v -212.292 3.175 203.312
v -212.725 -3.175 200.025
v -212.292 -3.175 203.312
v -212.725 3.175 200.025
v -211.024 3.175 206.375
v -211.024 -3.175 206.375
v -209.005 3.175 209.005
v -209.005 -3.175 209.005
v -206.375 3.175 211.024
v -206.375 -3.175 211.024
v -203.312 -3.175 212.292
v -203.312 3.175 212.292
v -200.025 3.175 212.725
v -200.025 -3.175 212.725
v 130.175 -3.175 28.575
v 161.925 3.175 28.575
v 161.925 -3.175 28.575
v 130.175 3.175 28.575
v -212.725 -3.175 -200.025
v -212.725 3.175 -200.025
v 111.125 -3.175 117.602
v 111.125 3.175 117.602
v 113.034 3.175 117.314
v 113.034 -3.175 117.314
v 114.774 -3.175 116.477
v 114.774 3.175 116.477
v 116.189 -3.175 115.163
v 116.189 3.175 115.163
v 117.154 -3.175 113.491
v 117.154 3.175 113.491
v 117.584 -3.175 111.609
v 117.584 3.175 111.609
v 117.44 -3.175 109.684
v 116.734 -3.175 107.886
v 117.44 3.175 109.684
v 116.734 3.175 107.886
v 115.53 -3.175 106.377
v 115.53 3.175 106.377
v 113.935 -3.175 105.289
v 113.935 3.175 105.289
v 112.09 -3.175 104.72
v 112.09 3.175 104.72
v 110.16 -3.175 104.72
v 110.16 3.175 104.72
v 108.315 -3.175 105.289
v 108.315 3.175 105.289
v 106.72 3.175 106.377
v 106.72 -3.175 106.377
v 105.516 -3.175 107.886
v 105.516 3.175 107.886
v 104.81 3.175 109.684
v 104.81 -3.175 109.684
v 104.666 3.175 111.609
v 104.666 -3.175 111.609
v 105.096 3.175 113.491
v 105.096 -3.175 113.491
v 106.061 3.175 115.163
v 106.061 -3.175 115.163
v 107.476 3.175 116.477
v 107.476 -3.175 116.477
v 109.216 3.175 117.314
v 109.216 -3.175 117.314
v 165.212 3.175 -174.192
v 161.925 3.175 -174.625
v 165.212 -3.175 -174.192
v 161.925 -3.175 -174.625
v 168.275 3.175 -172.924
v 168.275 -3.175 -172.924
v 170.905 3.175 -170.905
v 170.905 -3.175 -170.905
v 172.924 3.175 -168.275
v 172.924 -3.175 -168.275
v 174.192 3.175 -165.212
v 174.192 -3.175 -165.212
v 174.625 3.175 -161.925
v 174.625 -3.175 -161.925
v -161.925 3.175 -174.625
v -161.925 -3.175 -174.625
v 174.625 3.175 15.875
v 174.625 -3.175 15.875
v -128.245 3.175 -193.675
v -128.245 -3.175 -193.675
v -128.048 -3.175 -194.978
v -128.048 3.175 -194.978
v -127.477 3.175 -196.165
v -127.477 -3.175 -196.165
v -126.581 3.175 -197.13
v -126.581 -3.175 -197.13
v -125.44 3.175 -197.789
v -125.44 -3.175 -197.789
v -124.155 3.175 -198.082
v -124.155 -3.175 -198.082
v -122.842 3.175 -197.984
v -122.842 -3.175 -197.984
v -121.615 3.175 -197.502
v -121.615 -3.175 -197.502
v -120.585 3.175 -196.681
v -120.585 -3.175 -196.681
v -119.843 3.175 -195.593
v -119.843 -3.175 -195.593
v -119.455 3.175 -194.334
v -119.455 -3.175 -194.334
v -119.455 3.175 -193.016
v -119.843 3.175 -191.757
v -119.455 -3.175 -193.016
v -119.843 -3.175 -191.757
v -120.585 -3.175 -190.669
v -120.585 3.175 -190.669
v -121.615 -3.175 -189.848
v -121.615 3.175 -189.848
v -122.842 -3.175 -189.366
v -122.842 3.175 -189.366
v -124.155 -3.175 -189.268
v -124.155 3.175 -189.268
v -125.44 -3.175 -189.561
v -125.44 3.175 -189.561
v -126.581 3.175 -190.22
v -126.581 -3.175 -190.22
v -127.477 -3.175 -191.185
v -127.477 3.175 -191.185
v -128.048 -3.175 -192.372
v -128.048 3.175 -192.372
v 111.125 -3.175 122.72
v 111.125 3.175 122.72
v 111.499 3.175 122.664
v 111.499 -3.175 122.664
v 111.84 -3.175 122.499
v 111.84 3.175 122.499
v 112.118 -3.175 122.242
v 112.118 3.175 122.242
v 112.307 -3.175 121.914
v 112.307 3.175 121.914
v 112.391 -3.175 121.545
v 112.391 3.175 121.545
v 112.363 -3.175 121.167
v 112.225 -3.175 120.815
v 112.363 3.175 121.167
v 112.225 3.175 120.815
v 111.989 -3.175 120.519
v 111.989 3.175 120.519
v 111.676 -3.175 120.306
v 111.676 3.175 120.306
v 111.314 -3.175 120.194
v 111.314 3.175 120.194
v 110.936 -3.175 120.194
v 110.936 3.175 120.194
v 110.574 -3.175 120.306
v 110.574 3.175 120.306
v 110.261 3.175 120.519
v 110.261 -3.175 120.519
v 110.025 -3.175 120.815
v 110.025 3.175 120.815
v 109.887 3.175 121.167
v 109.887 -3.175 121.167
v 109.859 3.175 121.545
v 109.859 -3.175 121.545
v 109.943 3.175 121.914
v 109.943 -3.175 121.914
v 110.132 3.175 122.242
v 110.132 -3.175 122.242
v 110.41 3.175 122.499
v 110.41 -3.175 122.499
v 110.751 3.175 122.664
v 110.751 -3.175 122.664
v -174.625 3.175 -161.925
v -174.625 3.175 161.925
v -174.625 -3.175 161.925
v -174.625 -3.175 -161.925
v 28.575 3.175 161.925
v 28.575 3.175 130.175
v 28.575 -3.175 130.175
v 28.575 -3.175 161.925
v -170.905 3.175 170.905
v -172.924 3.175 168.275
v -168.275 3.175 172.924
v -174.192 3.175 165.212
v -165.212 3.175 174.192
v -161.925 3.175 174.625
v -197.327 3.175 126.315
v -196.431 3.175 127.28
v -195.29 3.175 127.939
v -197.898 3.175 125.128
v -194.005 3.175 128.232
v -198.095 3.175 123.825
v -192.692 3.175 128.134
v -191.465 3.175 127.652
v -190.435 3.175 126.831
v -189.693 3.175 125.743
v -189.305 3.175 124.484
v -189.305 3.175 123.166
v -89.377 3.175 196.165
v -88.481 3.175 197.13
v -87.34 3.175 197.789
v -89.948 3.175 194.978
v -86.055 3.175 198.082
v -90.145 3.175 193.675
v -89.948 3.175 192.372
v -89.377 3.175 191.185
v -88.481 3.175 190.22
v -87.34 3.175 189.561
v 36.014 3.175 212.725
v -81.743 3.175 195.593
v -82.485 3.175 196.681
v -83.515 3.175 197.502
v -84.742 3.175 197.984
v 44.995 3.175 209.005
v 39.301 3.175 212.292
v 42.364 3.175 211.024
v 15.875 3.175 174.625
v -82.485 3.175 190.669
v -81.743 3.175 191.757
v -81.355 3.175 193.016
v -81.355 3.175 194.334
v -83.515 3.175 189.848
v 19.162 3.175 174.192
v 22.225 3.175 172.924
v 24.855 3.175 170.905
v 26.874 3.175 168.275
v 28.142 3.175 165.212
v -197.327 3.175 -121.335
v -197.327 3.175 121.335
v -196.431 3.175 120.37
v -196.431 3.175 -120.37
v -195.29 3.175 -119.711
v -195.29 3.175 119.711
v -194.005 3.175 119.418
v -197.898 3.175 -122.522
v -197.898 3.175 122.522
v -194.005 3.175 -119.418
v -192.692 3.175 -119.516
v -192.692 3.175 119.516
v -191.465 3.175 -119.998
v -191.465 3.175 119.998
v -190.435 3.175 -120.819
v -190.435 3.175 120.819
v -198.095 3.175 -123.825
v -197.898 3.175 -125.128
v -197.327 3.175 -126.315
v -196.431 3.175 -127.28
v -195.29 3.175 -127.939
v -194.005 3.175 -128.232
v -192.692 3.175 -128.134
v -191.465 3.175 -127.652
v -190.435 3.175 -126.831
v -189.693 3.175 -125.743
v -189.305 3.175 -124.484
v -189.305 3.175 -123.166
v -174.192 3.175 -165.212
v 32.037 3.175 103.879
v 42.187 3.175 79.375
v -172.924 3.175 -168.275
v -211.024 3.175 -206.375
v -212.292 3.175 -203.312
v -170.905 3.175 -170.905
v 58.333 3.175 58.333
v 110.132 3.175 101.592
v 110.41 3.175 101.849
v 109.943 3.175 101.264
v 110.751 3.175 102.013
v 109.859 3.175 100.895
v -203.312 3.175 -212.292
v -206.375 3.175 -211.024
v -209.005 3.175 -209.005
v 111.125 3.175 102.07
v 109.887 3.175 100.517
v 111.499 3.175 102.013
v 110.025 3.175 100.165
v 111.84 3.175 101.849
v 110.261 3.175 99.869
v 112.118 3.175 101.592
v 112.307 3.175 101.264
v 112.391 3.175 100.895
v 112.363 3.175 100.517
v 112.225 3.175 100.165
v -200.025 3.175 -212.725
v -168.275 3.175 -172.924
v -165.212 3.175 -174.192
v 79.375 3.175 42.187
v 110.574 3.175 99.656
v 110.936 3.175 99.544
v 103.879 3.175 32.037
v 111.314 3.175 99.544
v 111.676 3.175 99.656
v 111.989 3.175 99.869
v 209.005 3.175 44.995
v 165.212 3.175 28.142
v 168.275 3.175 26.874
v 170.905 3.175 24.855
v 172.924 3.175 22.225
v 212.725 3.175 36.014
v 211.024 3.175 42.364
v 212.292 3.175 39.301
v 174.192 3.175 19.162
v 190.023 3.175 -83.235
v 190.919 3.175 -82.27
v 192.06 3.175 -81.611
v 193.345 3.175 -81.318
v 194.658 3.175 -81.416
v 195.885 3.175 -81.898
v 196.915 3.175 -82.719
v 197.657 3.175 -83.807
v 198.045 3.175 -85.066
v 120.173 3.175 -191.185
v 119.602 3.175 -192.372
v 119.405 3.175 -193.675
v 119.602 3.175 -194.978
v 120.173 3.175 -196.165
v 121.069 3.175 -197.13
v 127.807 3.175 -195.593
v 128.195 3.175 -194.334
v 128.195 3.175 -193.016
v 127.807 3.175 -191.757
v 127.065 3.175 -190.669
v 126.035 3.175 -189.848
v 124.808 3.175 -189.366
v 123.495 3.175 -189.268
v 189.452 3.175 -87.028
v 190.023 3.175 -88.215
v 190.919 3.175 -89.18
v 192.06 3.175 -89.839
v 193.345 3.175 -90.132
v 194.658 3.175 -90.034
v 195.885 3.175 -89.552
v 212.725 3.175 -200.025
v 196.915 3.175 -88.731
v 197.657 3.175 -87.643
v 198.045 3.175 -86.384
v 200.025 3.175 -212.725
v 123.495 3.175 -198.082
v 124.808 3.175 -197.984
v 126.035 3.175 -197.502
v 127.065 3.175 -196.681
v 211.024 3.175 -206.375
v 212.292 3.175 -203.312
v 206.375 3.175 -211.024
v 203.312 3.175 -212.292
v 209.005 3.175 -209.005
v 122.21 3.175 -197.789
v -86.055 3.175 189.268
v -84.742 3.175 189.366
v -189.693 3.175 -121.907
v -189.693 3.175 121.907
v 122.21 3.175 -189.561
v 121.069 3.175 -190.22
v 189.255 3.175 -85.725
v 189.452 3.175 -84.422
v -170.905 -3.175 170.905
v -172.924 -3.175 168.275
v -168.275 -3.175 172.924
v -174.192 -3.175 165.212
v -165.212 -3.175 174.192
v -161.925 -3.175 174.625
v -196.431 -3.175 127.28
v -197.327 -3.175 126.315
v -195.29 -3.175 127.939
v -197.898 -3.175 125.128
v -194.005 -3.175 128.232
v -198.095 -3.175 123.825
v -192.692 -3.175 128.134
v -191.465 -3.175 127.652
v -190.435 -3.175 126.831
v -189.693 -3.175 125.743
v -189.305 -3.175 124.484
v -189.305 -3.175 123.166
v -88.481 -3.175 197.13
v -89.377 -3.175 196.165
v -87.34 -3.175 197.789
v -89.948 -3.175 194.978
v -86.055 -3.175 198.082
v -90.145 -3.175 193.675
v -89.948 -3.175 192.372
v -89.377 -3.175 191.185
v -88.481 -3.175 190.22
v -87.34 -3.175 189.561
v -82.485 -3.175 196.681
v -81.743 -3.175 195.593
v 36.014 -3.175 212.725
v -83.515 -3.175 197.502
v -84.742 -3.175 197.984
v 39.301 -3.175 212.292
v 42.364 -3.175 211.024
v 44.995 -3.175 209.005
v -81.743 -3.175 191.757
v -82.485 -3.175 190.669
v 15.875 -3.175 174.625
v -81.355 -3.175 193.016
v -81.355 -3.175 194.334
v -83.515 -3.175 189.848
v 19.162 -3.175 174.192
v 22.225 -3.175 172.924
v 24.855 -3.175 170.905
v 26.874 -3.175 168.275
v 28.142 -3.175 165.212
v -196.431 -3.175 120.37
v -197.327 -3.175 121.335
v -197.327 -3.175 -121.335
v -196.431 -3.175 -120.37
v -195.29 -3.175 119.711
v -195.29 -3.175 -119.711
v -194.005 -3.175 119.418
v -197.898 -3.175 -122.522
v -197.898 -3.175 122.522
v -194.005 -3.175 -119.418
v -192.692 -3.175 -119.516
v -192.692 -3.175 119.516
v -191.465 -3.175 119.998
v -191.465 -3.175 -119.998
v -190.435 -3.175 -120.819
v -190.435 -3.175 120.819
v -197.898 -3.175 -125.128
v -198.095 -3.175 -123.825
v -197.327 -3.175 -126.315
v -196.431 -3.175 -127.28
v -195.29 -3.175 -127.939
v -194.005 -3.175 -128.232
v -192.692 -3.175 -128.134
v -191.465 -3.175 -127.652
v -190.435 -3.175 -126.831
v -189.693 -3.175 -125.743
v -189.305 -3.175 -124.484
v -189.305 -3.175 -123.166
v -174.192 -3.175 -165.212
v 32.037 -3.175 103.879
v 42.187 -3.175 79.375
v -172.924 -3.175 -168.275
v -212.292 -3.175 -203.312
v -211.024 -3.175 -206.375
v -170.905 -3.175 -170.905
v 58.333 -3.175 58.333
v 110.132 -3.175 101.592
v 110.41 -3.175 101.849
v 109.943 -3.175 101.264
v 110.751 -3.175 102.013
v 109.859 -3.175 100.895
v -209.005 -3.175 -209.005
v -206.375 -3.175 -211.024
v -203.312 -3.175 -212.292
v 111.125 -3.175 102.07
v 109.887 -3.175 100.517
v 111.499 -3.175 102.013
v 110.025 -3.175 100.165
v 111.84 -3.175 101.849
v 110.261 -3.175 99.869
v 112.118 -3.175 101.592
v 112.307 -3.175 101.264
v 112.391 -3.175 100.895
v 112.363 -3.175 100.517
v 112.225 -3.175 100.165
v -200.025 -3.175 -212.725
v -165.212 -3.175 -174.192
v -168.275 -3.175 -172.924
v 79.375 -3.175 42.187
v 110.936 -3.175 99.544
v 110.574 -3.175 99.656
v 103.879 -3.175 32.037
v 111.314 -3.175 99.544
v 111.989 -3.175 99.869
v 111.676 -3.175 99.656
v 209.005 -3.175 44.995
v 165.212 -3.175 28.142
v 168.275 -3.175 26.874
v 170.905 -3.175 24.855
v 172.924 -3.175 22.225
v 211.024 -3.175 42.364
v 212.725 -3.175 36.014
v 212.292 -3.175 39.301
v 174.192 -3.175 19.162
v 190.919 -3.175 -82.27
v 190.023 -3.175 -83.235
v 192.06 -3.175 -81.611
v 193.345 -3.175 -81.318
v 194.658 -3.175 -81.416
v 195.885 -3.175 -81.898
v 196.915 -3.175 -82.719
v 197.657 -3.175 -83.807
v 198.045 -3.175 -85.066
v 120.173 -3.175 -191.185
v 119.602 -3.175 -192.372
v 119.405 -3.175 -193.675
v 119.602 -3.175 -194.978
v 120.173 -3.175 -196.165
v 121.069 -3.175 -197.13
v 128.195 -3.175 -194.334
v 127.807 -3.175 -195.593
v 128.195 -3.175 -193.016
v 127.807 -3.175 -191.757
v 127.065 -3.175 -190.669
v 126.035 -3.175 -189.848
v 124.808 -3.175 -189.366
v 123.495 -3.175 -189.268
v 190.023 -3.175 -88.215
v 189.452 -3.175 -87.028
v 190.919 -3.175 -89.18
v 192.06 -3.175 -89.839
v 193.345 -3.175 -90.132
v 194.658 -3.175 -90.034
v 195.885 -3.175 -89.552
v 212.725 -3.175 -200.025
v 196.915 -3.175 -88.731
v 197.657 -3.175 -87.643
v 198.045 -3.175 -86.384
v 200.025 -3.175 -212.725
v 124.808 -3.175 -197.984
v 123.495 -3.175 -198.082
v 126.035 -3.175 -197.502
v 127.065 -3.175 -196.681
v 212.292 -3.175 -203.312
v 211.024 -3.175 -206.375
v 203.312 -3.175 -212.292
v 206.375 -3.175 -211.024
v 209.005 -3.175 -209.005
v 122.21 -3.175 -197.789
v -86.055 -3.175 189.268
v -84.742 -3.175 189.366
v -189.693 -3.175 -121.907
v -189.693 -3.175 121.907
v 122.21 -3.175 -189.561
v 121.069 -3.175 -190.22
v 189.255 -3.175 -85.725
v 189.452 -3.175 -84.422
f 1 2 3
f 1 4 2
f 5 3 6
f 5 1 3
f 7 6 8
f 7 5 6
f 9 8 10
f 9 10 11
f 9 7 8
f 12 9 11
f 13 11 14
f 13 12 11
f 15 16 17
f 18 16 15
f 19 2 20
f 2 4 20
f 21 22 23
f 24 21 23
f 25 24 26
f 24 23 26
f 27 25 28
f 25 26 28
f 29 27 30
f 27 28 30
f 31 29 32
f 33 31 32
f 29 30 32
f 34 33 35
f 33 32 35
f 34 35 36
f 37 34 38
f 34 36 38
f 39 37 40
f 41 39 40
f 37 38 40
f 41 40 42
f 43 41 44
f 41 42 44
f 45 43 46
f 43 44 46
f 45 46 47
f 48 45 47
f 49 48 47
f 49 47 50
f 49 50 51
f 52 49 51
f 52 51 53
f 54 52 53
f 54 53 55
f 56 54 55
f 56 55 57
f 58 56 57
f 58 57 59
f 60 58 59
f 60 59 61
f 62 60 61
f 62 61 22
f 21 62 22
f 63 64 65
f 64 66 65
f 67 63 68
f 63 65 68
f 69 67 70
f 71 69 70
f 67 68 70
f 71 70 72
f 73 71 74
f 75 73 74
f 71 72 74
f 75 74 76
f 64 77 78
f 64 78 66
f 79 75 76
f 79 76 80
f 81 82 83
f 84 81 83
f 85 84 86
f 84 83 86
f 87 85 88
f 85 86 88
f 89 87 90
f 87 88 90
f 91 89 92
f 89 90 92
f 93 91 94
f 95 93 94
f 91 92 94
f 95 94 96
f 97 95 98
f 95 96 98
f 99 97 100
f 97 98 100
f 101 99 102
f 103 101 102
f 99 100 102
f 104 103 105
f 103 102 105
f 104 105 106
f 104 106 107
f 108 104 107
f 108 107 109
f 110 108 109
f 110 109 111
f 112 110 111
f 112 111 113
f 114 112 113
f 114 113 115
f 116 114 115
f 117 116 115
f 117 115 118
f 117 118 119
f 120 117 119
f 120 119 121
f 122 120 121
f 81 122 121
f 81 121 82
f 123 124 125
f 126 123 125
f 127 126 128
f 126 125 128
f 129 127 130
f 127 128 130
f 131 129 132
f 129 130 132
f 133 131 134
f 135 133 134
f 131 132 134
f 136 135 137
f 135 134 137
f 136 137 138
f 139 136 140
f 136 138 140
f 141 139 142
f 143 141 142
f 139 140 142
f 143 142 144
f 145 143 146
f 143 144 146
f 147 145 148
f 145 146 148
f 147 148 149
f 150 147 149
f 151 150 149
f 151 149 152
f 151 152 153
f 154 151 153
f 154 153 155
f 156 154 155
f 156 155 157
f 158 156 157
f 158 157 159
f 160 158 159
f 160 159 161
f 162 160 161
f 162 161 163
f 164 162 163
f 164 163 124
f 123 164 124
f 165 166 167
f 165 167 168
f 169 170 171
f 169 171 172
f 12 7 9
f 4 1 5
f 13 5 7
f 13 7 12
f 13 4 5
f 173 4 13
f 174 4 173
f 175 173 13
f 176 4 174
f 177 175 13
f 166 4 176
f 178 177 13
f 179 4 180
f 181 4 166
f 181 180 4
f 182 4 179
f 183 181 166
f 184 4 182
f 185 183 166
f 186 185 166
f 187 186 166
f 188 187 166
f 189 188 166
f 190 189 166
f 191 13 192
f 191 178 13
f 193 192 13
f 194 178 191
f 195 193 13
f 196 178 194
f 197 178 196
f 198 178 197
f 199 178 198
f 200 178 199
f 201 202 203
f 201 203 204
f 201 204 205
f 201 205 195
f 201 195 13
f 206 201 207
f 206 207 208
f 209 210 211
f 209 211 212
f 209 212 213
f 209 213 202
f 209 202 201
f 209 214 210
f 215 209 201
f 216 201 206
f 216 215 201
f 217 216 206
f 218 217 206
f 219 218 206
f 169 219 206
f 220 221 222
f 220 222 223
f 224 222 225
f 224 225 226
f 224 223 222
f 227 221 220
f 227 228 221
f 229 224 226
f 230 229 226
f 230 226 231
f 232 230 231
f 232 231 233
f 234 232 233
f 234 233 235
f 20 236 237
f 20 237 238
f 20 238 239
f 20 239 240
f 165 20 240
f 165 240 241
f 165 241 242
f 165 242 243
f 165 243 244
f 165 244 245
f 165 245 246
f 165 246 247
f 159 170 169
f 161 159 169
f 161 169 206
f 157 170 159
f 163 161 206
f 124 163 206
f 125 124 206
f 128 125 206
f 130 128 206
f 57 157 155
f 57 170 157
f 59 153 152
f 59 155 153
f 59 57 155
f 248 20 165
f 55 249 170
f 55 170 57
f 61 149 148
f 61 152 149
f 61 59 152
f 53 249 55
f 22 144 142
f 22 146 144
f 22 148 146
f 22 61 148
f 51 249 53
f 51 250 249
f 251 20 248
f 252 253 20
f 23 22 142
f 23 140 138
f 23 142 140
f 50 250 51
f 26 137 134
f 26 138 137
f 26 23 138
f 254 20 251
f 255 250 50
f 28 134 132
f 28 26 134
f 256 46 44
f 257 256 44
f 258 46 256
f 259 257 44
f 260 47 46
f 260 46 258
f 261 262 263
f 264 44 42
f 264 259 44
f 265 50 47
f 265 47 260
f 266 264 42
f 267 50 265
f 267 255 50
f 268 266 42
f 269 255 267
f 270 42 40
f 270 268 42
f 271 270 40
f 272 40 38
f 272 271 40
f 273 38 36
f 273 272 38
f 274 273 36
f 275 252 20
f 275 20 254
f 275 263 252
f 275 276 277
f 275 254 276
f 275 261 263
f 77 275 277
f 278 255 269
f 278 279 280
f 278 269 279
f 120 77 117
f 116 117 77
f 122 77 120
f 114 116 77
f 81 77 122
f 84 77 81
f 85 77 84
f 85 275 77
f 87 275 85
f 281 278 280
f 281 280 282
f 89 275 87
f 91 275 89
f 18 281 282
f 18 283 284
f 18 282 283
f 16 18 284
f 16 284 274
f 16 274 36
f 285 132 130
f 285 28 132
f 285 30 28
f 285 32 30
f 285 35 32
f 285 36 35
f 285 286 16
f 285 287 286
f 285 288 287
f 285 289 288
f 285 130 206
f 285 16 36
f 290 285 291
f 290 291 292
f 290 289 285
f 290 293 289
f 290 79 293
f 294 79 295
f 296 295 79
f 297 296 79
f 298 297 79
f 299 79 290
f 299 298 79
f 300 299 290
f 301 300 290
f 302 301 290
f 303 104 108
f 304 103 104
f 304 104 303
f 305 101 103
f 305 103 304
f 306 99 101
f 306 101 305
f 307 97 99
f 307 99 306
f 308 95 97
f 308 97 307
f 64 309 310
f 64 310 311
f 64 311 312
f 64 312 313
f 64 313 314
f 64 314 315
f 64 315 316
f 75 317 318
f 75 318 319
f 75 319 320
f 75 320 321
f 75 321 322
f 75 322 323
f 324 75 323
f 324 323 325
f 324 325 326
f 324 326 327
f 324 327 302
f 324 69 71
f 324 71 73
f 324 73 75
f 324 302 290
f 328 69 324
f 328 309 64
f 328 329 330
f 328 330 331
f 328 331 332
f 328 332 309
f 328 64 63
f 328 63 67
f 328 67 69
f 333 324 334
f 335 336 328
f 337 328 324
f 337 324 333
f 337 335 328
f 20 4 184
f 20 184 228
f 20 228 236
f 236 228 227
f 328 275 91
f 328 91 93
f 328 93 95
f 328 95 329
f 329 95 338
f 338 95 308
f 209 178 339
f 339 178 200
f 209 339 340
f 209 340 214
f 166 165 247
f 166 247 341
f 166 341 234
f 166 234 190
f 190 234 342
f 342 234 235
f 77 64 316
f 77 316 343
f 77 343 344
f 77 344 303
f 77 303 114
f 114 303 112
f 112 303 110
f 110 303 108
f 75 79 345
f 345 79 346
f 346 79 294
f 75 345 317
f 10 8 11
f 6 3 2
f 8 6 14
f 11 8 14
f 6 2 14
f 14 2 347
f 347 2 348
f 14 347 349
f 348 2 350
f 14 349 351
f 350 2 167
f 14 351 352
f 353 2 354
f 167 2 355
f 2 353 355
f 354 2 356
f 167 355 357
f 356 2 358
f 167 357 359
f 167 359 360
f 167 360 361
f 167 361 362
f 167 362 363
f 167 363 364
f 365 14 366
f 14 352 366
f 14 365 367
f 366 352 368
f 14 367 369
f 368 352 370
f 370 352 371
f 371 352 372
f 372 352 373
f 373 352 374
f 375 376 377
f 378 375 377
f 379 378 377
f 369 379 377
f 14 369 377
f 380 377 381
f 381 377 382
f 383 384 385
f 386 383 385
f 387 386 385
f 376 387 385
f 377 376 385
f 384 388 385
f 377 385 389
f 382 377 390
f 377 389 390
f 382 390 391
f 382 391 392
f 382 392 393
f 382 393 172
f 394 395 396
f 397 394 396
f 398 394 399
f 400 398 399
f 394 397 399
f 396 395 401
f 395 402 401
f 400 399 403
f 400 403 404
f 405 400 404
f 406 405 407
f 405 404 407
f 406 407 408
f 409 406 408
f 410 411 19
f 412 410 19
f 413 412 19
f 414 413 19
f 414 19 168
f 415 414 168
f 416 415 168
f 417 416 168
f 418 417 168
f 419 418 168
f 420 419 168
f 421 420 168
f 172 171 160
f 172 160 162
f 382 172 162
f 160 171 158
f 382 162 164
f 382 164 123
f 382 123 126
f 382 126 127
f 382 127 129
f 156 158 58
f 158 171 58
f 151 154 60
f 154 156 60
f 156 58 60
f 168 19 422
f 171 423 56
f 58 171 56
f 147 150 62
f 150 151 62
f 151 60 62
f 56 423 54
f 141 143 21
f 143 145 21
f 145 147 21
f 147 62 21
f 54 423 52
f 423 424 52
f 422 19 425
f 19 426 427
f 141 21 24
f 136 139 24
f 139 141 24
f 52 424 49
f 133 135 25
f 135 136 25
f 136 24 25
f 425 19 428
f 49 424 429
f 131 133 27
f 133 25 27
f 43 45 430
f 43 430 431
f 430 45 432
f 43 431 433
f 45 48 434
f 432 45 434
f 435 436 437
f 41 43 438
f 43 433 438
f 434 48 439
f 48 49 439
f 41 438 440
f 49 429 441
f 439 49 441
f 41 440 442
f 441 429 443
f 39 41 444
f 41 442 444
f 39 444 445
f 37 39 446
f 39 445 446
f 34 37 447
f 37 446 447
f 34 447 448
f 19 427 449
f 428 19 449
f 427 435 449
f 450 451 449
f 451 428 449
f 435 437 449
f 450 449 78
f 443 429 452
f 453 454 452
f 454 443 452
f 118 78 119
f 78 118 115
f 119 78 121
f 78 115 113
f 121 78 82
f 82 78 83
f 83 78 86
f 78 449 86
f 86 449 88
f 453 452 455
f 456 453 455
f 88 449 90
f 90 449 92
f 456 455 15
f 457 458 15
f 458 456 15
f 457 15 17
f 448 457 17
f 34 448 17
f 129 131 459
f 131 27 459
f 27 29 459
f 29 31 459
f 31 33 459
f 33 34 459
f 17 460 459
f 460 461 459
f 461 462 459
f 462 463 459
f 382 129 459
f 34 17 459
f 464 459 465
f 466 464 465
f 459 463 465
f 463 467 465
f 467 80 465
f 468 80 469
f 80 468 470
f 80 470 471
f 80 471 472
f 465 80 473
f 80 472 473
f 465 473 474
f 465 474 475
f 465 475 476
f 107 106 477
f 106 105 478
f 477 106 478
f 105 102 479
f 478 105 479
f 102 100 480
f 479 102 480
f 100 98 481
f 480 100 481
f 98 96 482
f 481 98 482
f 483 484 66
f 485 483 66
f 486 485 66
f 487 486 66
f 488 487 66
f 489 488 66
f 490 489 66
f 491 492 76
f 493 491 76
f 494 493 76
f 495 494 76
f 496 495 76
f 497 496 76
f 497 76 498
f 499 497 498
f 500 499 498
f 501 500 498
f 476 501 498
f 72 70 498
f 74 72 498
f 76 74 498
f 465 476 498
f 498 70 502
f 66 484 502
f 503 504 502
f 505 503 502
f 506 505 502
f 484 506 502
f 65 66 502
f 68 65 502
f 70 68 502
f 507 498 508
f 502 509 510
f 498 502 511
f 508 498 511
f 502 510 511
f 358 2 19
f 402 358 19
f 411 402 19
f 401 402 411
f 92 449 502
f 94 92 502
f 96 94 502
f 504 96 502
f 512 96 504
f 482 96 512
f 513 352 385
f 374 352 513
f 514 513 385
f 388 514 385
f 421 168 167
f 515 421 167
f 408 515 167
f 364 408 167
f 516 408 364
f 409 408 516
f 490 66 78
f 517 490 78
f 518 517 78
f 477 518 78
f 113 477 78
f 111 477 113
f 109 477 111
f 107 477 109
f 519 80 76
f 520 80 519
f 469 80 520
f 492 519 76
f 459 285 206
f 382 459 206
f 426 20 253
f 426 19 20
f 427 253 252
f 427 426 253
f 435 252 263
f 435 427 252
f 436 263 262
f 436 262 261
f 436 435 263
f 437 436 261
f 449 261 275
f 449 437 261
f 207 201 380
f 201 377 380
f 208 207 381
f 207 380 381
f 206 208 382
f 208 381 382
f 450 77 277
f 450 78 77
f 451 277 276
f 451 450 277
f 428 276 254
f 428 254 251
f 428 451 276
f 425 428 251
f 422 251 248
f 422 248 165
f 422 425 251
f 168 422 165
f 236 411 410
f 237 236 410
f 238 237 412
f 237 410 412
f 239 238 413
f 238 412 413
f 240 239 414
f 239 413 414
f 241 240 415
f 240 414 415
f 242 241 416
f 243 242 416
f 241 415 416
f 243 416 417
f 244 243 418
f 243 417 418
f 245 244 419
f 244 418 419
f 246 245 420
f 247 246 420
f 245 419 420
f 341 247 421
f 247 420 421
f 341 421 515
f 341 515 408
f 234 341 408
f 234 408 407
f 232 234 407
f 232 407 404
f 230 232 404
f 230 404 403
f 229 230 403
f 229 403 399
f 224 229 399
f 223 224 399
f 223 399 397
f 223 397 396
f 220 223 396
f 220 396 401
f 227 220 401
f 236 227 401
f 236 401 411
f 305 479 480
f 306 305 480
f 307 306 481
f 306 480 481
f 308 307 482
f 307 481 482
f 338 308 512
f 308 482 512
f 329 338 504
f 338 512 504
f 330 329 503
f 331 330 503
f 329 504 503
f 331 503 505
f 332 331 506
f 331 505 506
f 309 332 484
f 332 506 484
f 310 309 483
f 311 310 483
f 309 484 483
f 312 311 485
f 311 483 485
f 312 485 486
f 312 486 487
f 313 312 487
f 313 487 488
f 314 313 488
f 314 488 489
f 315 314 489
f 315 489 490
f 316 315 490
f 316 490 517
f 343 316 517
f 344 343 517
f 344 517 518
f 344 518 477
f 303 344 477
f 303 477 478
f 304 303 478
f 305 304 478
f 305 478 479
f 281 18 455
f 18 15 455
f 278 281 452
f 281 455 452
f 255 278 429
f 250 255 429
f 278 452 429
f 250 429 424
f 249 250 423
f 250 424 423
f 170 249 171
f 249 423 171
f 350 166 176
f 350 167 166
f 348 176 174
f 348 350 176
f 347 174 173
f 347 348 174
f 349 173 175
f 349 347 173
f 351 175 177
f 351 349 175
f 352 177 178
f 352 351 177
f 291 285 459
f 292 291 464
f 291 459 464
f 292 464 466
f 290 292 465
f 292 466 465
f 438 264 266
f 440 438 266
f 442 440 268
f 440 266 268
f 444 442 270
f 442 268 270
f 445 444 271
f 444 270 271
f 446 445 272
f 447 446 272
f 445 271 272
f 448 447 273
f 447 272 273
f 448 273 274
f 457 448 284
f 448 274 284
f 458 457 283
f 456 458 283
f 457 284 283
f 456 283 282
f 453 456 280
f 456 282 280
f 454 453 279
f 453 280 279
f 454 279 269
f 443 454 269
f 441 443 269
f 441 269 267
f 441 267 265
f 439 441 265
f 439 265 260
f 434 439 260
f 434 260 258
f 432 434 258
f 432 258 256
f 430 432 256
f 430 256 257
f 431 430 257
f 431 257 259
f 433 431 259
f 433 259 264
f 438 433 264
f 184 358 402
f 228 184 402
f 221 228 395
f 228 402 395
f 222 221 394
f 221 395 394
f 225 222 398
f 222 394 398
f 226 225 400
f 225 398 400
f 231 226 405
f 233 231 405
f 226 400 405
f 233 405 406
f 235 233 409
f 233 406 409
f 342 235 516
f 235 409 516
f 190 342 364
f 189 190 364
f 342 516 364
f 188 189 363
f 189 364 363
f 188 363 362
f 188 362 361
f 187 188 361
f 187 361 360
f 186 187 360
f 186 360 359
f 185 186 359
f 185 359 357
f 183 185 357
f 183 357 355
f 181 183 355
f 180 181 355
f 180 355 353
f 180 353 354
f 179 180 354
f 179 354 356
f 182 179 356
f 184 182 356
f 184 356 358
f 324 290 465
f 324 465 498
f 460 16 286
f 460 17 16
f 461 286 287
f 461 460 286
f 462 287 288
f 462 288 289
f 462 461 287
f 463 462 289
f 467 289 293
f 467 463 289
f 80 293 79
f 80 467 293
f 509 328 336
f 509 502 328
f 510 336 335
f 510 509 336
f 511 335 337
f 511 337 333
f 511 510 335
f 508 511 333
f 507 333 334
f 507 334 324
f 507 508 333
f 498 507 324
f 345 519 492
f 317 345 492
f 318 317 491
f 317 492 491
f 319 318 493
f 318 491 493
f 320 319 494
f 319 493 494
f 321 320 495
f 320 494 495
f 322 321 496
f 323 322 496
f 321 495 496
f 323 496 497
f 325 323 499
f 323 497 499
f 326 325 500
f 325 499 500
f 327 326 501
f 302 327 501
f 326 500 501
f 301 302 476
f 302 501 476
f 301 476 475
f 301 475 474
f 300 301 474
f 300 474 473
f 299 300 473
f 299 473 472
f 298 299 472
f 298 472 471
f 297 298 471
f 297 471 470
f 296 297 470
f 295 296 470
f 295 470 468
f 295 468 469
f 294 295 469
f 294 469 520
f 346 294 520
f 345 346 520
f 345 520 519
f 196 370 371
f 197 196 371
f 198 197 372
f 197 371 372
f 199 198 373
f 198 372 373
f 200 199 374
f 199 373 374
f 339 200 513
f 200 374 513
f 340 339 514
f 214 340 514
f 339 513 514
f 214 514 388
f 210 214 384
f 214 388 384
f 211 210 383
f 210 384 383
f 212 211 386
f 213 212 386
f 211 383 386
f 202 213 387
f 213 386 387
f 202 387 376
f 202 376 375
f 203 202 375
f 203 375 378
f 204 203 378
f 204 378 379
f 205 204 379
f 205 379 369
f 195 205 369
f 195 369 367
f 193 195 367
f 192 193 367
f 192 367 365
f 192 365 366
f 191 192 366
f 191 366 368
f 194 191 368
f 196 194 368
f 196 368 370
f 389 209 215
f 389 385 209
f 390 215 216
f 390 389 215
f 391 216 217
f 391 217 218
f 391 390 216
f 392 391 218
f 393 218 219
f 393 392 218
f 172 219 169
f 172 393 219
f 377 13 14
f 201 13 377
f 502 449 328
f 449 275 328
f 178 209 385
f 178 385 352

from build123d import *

# Parameters (mm, degrees)
SKETCH1_W                = 425.45
SKETCH1_H                = 425.45
BOSS_EXTRUDE1_DEPTH      = 3.175
CUT_EXTRUDE1_DEPTH       = 301.90558943
SKETCH3_R                = 6.477
SKETCH3_R_2              = 1.27
CUT_EXTRUDE2_DEPTH       = 301.90558943
F_0_332_DIAMETER_HOLE1_D = 8.8392
CUT_EXTRUDE3_DEPTH       = 301.90558943
FILLET1_R                = 12.7
FILLET2_R                = 101.6


with BuildPart() as part:
    # Sketch1 → Boss-Extrude1 (new, symmetric)
    with BuildSketch(Plane(origin=(0, 0, 0), x_dir=(1, 0, 0), z_dir=(0, 1, 0))):
        Rectangle(SKETCH1_W, SKETCH1_H)
    extrude(amount=BOSS_EXTRUDE1_DEPTH, both=True)

    # Sketch2 → Cut-Extrude1 (cut, through all)
    with BuildSketch(Plane(origin=(0, 3.175, 0), x_dir=(1, 0, 0), z_dir=(0, 1, 0))):
        Polygon((212.725, -212.725), (212.725, -41.275), (41.275, -212.725), align=None)
    extrude(amount=-CUT_EXTRUDE1_DEPTH, mode=Mode.SUBTRACT)

    # Sketch3 → Cut-Extrude2 (cut, through all)
    with BuildSketch(Plane(origin=(0, 3.175, 0), x_dir=(1, 0, 0), z_dir=(0, 1, 0))):
        with Locations(Location((111.125, -111.125, 0), (0, 0, 270))):
            Circle(SKETCH3_R)
        with Locations(Location((111.125, -100.7999, 0), (0, 0, 270))):
            Circle(SKETCH3_R_2)
        with Locations(Location((111.125, -121.4501, 0), (0, 0, 270))):
            Circle(SKETCH3_R_2)
    extrude(amount=-CUT_EXTRUDE2_DEPTH, mode=Mode.SUBTRACT)

    # 0.332_ Diameter Hole1 (through all)
    with Locations(Plane(origin=(0, 3.175, 0), x_dir=(1, 0, 0), z_dir=(0, 1, 0))):
        with Locations((-85.725, -193.675), (-193.675, -123.825), (-193.675, 123.825), (-123.825, 193.675), (123.825, 193.675), (193.675, 85.725)):
            Hole(F_0_332_DIAMETER_HOLE1_D / 2)

    # Sketch6 → Cut-Extrude3 (cut, through all)
    with BuildSketch(Plane(origin=(0, 3.175, 0), x_dir=(1, 0, 0), z_dir=(0, 1, 0))):
        Polygon((174.625, 174.625), (174.625, -28.575), (28.575, -28.575), (28.575, -174.625), (-174.625, -174.625), (-174.625, 174.625), align=None)
    extrude(amount=-CUT_EXTRUDE3_DEPTH, mode=Mode.SUBTRACT)

    # Fillet1
    fillet1_edges = [part.edges().sort_by_distance(p)[0] for p in [
        (41.275, 0, 212.725),
        (212.725, 0, 41.275),
        (-212.725, 0, 212.725),
        (-212.725, 0, -212.725),
        (-174.625, 0, -174.625),
        (212.725, 0, -212.725),
        (174.625, 0, -174.625),
        (174.625, 0, 28.575),
        (28.575, 0, 174.625),
        (-174.625, 0, 174.625),
    ]]
    fillet(fillet1_edges, radius=FILLET1_R)

    # Fillet2
    fillet2_edges = [part.edges().sort_by_distance(p)[0] for p in [
        (28.575, 0, 28.575),
    ]]
    fillet(fillet2_edges, radius=FILLET2_R)


solid = part.part
